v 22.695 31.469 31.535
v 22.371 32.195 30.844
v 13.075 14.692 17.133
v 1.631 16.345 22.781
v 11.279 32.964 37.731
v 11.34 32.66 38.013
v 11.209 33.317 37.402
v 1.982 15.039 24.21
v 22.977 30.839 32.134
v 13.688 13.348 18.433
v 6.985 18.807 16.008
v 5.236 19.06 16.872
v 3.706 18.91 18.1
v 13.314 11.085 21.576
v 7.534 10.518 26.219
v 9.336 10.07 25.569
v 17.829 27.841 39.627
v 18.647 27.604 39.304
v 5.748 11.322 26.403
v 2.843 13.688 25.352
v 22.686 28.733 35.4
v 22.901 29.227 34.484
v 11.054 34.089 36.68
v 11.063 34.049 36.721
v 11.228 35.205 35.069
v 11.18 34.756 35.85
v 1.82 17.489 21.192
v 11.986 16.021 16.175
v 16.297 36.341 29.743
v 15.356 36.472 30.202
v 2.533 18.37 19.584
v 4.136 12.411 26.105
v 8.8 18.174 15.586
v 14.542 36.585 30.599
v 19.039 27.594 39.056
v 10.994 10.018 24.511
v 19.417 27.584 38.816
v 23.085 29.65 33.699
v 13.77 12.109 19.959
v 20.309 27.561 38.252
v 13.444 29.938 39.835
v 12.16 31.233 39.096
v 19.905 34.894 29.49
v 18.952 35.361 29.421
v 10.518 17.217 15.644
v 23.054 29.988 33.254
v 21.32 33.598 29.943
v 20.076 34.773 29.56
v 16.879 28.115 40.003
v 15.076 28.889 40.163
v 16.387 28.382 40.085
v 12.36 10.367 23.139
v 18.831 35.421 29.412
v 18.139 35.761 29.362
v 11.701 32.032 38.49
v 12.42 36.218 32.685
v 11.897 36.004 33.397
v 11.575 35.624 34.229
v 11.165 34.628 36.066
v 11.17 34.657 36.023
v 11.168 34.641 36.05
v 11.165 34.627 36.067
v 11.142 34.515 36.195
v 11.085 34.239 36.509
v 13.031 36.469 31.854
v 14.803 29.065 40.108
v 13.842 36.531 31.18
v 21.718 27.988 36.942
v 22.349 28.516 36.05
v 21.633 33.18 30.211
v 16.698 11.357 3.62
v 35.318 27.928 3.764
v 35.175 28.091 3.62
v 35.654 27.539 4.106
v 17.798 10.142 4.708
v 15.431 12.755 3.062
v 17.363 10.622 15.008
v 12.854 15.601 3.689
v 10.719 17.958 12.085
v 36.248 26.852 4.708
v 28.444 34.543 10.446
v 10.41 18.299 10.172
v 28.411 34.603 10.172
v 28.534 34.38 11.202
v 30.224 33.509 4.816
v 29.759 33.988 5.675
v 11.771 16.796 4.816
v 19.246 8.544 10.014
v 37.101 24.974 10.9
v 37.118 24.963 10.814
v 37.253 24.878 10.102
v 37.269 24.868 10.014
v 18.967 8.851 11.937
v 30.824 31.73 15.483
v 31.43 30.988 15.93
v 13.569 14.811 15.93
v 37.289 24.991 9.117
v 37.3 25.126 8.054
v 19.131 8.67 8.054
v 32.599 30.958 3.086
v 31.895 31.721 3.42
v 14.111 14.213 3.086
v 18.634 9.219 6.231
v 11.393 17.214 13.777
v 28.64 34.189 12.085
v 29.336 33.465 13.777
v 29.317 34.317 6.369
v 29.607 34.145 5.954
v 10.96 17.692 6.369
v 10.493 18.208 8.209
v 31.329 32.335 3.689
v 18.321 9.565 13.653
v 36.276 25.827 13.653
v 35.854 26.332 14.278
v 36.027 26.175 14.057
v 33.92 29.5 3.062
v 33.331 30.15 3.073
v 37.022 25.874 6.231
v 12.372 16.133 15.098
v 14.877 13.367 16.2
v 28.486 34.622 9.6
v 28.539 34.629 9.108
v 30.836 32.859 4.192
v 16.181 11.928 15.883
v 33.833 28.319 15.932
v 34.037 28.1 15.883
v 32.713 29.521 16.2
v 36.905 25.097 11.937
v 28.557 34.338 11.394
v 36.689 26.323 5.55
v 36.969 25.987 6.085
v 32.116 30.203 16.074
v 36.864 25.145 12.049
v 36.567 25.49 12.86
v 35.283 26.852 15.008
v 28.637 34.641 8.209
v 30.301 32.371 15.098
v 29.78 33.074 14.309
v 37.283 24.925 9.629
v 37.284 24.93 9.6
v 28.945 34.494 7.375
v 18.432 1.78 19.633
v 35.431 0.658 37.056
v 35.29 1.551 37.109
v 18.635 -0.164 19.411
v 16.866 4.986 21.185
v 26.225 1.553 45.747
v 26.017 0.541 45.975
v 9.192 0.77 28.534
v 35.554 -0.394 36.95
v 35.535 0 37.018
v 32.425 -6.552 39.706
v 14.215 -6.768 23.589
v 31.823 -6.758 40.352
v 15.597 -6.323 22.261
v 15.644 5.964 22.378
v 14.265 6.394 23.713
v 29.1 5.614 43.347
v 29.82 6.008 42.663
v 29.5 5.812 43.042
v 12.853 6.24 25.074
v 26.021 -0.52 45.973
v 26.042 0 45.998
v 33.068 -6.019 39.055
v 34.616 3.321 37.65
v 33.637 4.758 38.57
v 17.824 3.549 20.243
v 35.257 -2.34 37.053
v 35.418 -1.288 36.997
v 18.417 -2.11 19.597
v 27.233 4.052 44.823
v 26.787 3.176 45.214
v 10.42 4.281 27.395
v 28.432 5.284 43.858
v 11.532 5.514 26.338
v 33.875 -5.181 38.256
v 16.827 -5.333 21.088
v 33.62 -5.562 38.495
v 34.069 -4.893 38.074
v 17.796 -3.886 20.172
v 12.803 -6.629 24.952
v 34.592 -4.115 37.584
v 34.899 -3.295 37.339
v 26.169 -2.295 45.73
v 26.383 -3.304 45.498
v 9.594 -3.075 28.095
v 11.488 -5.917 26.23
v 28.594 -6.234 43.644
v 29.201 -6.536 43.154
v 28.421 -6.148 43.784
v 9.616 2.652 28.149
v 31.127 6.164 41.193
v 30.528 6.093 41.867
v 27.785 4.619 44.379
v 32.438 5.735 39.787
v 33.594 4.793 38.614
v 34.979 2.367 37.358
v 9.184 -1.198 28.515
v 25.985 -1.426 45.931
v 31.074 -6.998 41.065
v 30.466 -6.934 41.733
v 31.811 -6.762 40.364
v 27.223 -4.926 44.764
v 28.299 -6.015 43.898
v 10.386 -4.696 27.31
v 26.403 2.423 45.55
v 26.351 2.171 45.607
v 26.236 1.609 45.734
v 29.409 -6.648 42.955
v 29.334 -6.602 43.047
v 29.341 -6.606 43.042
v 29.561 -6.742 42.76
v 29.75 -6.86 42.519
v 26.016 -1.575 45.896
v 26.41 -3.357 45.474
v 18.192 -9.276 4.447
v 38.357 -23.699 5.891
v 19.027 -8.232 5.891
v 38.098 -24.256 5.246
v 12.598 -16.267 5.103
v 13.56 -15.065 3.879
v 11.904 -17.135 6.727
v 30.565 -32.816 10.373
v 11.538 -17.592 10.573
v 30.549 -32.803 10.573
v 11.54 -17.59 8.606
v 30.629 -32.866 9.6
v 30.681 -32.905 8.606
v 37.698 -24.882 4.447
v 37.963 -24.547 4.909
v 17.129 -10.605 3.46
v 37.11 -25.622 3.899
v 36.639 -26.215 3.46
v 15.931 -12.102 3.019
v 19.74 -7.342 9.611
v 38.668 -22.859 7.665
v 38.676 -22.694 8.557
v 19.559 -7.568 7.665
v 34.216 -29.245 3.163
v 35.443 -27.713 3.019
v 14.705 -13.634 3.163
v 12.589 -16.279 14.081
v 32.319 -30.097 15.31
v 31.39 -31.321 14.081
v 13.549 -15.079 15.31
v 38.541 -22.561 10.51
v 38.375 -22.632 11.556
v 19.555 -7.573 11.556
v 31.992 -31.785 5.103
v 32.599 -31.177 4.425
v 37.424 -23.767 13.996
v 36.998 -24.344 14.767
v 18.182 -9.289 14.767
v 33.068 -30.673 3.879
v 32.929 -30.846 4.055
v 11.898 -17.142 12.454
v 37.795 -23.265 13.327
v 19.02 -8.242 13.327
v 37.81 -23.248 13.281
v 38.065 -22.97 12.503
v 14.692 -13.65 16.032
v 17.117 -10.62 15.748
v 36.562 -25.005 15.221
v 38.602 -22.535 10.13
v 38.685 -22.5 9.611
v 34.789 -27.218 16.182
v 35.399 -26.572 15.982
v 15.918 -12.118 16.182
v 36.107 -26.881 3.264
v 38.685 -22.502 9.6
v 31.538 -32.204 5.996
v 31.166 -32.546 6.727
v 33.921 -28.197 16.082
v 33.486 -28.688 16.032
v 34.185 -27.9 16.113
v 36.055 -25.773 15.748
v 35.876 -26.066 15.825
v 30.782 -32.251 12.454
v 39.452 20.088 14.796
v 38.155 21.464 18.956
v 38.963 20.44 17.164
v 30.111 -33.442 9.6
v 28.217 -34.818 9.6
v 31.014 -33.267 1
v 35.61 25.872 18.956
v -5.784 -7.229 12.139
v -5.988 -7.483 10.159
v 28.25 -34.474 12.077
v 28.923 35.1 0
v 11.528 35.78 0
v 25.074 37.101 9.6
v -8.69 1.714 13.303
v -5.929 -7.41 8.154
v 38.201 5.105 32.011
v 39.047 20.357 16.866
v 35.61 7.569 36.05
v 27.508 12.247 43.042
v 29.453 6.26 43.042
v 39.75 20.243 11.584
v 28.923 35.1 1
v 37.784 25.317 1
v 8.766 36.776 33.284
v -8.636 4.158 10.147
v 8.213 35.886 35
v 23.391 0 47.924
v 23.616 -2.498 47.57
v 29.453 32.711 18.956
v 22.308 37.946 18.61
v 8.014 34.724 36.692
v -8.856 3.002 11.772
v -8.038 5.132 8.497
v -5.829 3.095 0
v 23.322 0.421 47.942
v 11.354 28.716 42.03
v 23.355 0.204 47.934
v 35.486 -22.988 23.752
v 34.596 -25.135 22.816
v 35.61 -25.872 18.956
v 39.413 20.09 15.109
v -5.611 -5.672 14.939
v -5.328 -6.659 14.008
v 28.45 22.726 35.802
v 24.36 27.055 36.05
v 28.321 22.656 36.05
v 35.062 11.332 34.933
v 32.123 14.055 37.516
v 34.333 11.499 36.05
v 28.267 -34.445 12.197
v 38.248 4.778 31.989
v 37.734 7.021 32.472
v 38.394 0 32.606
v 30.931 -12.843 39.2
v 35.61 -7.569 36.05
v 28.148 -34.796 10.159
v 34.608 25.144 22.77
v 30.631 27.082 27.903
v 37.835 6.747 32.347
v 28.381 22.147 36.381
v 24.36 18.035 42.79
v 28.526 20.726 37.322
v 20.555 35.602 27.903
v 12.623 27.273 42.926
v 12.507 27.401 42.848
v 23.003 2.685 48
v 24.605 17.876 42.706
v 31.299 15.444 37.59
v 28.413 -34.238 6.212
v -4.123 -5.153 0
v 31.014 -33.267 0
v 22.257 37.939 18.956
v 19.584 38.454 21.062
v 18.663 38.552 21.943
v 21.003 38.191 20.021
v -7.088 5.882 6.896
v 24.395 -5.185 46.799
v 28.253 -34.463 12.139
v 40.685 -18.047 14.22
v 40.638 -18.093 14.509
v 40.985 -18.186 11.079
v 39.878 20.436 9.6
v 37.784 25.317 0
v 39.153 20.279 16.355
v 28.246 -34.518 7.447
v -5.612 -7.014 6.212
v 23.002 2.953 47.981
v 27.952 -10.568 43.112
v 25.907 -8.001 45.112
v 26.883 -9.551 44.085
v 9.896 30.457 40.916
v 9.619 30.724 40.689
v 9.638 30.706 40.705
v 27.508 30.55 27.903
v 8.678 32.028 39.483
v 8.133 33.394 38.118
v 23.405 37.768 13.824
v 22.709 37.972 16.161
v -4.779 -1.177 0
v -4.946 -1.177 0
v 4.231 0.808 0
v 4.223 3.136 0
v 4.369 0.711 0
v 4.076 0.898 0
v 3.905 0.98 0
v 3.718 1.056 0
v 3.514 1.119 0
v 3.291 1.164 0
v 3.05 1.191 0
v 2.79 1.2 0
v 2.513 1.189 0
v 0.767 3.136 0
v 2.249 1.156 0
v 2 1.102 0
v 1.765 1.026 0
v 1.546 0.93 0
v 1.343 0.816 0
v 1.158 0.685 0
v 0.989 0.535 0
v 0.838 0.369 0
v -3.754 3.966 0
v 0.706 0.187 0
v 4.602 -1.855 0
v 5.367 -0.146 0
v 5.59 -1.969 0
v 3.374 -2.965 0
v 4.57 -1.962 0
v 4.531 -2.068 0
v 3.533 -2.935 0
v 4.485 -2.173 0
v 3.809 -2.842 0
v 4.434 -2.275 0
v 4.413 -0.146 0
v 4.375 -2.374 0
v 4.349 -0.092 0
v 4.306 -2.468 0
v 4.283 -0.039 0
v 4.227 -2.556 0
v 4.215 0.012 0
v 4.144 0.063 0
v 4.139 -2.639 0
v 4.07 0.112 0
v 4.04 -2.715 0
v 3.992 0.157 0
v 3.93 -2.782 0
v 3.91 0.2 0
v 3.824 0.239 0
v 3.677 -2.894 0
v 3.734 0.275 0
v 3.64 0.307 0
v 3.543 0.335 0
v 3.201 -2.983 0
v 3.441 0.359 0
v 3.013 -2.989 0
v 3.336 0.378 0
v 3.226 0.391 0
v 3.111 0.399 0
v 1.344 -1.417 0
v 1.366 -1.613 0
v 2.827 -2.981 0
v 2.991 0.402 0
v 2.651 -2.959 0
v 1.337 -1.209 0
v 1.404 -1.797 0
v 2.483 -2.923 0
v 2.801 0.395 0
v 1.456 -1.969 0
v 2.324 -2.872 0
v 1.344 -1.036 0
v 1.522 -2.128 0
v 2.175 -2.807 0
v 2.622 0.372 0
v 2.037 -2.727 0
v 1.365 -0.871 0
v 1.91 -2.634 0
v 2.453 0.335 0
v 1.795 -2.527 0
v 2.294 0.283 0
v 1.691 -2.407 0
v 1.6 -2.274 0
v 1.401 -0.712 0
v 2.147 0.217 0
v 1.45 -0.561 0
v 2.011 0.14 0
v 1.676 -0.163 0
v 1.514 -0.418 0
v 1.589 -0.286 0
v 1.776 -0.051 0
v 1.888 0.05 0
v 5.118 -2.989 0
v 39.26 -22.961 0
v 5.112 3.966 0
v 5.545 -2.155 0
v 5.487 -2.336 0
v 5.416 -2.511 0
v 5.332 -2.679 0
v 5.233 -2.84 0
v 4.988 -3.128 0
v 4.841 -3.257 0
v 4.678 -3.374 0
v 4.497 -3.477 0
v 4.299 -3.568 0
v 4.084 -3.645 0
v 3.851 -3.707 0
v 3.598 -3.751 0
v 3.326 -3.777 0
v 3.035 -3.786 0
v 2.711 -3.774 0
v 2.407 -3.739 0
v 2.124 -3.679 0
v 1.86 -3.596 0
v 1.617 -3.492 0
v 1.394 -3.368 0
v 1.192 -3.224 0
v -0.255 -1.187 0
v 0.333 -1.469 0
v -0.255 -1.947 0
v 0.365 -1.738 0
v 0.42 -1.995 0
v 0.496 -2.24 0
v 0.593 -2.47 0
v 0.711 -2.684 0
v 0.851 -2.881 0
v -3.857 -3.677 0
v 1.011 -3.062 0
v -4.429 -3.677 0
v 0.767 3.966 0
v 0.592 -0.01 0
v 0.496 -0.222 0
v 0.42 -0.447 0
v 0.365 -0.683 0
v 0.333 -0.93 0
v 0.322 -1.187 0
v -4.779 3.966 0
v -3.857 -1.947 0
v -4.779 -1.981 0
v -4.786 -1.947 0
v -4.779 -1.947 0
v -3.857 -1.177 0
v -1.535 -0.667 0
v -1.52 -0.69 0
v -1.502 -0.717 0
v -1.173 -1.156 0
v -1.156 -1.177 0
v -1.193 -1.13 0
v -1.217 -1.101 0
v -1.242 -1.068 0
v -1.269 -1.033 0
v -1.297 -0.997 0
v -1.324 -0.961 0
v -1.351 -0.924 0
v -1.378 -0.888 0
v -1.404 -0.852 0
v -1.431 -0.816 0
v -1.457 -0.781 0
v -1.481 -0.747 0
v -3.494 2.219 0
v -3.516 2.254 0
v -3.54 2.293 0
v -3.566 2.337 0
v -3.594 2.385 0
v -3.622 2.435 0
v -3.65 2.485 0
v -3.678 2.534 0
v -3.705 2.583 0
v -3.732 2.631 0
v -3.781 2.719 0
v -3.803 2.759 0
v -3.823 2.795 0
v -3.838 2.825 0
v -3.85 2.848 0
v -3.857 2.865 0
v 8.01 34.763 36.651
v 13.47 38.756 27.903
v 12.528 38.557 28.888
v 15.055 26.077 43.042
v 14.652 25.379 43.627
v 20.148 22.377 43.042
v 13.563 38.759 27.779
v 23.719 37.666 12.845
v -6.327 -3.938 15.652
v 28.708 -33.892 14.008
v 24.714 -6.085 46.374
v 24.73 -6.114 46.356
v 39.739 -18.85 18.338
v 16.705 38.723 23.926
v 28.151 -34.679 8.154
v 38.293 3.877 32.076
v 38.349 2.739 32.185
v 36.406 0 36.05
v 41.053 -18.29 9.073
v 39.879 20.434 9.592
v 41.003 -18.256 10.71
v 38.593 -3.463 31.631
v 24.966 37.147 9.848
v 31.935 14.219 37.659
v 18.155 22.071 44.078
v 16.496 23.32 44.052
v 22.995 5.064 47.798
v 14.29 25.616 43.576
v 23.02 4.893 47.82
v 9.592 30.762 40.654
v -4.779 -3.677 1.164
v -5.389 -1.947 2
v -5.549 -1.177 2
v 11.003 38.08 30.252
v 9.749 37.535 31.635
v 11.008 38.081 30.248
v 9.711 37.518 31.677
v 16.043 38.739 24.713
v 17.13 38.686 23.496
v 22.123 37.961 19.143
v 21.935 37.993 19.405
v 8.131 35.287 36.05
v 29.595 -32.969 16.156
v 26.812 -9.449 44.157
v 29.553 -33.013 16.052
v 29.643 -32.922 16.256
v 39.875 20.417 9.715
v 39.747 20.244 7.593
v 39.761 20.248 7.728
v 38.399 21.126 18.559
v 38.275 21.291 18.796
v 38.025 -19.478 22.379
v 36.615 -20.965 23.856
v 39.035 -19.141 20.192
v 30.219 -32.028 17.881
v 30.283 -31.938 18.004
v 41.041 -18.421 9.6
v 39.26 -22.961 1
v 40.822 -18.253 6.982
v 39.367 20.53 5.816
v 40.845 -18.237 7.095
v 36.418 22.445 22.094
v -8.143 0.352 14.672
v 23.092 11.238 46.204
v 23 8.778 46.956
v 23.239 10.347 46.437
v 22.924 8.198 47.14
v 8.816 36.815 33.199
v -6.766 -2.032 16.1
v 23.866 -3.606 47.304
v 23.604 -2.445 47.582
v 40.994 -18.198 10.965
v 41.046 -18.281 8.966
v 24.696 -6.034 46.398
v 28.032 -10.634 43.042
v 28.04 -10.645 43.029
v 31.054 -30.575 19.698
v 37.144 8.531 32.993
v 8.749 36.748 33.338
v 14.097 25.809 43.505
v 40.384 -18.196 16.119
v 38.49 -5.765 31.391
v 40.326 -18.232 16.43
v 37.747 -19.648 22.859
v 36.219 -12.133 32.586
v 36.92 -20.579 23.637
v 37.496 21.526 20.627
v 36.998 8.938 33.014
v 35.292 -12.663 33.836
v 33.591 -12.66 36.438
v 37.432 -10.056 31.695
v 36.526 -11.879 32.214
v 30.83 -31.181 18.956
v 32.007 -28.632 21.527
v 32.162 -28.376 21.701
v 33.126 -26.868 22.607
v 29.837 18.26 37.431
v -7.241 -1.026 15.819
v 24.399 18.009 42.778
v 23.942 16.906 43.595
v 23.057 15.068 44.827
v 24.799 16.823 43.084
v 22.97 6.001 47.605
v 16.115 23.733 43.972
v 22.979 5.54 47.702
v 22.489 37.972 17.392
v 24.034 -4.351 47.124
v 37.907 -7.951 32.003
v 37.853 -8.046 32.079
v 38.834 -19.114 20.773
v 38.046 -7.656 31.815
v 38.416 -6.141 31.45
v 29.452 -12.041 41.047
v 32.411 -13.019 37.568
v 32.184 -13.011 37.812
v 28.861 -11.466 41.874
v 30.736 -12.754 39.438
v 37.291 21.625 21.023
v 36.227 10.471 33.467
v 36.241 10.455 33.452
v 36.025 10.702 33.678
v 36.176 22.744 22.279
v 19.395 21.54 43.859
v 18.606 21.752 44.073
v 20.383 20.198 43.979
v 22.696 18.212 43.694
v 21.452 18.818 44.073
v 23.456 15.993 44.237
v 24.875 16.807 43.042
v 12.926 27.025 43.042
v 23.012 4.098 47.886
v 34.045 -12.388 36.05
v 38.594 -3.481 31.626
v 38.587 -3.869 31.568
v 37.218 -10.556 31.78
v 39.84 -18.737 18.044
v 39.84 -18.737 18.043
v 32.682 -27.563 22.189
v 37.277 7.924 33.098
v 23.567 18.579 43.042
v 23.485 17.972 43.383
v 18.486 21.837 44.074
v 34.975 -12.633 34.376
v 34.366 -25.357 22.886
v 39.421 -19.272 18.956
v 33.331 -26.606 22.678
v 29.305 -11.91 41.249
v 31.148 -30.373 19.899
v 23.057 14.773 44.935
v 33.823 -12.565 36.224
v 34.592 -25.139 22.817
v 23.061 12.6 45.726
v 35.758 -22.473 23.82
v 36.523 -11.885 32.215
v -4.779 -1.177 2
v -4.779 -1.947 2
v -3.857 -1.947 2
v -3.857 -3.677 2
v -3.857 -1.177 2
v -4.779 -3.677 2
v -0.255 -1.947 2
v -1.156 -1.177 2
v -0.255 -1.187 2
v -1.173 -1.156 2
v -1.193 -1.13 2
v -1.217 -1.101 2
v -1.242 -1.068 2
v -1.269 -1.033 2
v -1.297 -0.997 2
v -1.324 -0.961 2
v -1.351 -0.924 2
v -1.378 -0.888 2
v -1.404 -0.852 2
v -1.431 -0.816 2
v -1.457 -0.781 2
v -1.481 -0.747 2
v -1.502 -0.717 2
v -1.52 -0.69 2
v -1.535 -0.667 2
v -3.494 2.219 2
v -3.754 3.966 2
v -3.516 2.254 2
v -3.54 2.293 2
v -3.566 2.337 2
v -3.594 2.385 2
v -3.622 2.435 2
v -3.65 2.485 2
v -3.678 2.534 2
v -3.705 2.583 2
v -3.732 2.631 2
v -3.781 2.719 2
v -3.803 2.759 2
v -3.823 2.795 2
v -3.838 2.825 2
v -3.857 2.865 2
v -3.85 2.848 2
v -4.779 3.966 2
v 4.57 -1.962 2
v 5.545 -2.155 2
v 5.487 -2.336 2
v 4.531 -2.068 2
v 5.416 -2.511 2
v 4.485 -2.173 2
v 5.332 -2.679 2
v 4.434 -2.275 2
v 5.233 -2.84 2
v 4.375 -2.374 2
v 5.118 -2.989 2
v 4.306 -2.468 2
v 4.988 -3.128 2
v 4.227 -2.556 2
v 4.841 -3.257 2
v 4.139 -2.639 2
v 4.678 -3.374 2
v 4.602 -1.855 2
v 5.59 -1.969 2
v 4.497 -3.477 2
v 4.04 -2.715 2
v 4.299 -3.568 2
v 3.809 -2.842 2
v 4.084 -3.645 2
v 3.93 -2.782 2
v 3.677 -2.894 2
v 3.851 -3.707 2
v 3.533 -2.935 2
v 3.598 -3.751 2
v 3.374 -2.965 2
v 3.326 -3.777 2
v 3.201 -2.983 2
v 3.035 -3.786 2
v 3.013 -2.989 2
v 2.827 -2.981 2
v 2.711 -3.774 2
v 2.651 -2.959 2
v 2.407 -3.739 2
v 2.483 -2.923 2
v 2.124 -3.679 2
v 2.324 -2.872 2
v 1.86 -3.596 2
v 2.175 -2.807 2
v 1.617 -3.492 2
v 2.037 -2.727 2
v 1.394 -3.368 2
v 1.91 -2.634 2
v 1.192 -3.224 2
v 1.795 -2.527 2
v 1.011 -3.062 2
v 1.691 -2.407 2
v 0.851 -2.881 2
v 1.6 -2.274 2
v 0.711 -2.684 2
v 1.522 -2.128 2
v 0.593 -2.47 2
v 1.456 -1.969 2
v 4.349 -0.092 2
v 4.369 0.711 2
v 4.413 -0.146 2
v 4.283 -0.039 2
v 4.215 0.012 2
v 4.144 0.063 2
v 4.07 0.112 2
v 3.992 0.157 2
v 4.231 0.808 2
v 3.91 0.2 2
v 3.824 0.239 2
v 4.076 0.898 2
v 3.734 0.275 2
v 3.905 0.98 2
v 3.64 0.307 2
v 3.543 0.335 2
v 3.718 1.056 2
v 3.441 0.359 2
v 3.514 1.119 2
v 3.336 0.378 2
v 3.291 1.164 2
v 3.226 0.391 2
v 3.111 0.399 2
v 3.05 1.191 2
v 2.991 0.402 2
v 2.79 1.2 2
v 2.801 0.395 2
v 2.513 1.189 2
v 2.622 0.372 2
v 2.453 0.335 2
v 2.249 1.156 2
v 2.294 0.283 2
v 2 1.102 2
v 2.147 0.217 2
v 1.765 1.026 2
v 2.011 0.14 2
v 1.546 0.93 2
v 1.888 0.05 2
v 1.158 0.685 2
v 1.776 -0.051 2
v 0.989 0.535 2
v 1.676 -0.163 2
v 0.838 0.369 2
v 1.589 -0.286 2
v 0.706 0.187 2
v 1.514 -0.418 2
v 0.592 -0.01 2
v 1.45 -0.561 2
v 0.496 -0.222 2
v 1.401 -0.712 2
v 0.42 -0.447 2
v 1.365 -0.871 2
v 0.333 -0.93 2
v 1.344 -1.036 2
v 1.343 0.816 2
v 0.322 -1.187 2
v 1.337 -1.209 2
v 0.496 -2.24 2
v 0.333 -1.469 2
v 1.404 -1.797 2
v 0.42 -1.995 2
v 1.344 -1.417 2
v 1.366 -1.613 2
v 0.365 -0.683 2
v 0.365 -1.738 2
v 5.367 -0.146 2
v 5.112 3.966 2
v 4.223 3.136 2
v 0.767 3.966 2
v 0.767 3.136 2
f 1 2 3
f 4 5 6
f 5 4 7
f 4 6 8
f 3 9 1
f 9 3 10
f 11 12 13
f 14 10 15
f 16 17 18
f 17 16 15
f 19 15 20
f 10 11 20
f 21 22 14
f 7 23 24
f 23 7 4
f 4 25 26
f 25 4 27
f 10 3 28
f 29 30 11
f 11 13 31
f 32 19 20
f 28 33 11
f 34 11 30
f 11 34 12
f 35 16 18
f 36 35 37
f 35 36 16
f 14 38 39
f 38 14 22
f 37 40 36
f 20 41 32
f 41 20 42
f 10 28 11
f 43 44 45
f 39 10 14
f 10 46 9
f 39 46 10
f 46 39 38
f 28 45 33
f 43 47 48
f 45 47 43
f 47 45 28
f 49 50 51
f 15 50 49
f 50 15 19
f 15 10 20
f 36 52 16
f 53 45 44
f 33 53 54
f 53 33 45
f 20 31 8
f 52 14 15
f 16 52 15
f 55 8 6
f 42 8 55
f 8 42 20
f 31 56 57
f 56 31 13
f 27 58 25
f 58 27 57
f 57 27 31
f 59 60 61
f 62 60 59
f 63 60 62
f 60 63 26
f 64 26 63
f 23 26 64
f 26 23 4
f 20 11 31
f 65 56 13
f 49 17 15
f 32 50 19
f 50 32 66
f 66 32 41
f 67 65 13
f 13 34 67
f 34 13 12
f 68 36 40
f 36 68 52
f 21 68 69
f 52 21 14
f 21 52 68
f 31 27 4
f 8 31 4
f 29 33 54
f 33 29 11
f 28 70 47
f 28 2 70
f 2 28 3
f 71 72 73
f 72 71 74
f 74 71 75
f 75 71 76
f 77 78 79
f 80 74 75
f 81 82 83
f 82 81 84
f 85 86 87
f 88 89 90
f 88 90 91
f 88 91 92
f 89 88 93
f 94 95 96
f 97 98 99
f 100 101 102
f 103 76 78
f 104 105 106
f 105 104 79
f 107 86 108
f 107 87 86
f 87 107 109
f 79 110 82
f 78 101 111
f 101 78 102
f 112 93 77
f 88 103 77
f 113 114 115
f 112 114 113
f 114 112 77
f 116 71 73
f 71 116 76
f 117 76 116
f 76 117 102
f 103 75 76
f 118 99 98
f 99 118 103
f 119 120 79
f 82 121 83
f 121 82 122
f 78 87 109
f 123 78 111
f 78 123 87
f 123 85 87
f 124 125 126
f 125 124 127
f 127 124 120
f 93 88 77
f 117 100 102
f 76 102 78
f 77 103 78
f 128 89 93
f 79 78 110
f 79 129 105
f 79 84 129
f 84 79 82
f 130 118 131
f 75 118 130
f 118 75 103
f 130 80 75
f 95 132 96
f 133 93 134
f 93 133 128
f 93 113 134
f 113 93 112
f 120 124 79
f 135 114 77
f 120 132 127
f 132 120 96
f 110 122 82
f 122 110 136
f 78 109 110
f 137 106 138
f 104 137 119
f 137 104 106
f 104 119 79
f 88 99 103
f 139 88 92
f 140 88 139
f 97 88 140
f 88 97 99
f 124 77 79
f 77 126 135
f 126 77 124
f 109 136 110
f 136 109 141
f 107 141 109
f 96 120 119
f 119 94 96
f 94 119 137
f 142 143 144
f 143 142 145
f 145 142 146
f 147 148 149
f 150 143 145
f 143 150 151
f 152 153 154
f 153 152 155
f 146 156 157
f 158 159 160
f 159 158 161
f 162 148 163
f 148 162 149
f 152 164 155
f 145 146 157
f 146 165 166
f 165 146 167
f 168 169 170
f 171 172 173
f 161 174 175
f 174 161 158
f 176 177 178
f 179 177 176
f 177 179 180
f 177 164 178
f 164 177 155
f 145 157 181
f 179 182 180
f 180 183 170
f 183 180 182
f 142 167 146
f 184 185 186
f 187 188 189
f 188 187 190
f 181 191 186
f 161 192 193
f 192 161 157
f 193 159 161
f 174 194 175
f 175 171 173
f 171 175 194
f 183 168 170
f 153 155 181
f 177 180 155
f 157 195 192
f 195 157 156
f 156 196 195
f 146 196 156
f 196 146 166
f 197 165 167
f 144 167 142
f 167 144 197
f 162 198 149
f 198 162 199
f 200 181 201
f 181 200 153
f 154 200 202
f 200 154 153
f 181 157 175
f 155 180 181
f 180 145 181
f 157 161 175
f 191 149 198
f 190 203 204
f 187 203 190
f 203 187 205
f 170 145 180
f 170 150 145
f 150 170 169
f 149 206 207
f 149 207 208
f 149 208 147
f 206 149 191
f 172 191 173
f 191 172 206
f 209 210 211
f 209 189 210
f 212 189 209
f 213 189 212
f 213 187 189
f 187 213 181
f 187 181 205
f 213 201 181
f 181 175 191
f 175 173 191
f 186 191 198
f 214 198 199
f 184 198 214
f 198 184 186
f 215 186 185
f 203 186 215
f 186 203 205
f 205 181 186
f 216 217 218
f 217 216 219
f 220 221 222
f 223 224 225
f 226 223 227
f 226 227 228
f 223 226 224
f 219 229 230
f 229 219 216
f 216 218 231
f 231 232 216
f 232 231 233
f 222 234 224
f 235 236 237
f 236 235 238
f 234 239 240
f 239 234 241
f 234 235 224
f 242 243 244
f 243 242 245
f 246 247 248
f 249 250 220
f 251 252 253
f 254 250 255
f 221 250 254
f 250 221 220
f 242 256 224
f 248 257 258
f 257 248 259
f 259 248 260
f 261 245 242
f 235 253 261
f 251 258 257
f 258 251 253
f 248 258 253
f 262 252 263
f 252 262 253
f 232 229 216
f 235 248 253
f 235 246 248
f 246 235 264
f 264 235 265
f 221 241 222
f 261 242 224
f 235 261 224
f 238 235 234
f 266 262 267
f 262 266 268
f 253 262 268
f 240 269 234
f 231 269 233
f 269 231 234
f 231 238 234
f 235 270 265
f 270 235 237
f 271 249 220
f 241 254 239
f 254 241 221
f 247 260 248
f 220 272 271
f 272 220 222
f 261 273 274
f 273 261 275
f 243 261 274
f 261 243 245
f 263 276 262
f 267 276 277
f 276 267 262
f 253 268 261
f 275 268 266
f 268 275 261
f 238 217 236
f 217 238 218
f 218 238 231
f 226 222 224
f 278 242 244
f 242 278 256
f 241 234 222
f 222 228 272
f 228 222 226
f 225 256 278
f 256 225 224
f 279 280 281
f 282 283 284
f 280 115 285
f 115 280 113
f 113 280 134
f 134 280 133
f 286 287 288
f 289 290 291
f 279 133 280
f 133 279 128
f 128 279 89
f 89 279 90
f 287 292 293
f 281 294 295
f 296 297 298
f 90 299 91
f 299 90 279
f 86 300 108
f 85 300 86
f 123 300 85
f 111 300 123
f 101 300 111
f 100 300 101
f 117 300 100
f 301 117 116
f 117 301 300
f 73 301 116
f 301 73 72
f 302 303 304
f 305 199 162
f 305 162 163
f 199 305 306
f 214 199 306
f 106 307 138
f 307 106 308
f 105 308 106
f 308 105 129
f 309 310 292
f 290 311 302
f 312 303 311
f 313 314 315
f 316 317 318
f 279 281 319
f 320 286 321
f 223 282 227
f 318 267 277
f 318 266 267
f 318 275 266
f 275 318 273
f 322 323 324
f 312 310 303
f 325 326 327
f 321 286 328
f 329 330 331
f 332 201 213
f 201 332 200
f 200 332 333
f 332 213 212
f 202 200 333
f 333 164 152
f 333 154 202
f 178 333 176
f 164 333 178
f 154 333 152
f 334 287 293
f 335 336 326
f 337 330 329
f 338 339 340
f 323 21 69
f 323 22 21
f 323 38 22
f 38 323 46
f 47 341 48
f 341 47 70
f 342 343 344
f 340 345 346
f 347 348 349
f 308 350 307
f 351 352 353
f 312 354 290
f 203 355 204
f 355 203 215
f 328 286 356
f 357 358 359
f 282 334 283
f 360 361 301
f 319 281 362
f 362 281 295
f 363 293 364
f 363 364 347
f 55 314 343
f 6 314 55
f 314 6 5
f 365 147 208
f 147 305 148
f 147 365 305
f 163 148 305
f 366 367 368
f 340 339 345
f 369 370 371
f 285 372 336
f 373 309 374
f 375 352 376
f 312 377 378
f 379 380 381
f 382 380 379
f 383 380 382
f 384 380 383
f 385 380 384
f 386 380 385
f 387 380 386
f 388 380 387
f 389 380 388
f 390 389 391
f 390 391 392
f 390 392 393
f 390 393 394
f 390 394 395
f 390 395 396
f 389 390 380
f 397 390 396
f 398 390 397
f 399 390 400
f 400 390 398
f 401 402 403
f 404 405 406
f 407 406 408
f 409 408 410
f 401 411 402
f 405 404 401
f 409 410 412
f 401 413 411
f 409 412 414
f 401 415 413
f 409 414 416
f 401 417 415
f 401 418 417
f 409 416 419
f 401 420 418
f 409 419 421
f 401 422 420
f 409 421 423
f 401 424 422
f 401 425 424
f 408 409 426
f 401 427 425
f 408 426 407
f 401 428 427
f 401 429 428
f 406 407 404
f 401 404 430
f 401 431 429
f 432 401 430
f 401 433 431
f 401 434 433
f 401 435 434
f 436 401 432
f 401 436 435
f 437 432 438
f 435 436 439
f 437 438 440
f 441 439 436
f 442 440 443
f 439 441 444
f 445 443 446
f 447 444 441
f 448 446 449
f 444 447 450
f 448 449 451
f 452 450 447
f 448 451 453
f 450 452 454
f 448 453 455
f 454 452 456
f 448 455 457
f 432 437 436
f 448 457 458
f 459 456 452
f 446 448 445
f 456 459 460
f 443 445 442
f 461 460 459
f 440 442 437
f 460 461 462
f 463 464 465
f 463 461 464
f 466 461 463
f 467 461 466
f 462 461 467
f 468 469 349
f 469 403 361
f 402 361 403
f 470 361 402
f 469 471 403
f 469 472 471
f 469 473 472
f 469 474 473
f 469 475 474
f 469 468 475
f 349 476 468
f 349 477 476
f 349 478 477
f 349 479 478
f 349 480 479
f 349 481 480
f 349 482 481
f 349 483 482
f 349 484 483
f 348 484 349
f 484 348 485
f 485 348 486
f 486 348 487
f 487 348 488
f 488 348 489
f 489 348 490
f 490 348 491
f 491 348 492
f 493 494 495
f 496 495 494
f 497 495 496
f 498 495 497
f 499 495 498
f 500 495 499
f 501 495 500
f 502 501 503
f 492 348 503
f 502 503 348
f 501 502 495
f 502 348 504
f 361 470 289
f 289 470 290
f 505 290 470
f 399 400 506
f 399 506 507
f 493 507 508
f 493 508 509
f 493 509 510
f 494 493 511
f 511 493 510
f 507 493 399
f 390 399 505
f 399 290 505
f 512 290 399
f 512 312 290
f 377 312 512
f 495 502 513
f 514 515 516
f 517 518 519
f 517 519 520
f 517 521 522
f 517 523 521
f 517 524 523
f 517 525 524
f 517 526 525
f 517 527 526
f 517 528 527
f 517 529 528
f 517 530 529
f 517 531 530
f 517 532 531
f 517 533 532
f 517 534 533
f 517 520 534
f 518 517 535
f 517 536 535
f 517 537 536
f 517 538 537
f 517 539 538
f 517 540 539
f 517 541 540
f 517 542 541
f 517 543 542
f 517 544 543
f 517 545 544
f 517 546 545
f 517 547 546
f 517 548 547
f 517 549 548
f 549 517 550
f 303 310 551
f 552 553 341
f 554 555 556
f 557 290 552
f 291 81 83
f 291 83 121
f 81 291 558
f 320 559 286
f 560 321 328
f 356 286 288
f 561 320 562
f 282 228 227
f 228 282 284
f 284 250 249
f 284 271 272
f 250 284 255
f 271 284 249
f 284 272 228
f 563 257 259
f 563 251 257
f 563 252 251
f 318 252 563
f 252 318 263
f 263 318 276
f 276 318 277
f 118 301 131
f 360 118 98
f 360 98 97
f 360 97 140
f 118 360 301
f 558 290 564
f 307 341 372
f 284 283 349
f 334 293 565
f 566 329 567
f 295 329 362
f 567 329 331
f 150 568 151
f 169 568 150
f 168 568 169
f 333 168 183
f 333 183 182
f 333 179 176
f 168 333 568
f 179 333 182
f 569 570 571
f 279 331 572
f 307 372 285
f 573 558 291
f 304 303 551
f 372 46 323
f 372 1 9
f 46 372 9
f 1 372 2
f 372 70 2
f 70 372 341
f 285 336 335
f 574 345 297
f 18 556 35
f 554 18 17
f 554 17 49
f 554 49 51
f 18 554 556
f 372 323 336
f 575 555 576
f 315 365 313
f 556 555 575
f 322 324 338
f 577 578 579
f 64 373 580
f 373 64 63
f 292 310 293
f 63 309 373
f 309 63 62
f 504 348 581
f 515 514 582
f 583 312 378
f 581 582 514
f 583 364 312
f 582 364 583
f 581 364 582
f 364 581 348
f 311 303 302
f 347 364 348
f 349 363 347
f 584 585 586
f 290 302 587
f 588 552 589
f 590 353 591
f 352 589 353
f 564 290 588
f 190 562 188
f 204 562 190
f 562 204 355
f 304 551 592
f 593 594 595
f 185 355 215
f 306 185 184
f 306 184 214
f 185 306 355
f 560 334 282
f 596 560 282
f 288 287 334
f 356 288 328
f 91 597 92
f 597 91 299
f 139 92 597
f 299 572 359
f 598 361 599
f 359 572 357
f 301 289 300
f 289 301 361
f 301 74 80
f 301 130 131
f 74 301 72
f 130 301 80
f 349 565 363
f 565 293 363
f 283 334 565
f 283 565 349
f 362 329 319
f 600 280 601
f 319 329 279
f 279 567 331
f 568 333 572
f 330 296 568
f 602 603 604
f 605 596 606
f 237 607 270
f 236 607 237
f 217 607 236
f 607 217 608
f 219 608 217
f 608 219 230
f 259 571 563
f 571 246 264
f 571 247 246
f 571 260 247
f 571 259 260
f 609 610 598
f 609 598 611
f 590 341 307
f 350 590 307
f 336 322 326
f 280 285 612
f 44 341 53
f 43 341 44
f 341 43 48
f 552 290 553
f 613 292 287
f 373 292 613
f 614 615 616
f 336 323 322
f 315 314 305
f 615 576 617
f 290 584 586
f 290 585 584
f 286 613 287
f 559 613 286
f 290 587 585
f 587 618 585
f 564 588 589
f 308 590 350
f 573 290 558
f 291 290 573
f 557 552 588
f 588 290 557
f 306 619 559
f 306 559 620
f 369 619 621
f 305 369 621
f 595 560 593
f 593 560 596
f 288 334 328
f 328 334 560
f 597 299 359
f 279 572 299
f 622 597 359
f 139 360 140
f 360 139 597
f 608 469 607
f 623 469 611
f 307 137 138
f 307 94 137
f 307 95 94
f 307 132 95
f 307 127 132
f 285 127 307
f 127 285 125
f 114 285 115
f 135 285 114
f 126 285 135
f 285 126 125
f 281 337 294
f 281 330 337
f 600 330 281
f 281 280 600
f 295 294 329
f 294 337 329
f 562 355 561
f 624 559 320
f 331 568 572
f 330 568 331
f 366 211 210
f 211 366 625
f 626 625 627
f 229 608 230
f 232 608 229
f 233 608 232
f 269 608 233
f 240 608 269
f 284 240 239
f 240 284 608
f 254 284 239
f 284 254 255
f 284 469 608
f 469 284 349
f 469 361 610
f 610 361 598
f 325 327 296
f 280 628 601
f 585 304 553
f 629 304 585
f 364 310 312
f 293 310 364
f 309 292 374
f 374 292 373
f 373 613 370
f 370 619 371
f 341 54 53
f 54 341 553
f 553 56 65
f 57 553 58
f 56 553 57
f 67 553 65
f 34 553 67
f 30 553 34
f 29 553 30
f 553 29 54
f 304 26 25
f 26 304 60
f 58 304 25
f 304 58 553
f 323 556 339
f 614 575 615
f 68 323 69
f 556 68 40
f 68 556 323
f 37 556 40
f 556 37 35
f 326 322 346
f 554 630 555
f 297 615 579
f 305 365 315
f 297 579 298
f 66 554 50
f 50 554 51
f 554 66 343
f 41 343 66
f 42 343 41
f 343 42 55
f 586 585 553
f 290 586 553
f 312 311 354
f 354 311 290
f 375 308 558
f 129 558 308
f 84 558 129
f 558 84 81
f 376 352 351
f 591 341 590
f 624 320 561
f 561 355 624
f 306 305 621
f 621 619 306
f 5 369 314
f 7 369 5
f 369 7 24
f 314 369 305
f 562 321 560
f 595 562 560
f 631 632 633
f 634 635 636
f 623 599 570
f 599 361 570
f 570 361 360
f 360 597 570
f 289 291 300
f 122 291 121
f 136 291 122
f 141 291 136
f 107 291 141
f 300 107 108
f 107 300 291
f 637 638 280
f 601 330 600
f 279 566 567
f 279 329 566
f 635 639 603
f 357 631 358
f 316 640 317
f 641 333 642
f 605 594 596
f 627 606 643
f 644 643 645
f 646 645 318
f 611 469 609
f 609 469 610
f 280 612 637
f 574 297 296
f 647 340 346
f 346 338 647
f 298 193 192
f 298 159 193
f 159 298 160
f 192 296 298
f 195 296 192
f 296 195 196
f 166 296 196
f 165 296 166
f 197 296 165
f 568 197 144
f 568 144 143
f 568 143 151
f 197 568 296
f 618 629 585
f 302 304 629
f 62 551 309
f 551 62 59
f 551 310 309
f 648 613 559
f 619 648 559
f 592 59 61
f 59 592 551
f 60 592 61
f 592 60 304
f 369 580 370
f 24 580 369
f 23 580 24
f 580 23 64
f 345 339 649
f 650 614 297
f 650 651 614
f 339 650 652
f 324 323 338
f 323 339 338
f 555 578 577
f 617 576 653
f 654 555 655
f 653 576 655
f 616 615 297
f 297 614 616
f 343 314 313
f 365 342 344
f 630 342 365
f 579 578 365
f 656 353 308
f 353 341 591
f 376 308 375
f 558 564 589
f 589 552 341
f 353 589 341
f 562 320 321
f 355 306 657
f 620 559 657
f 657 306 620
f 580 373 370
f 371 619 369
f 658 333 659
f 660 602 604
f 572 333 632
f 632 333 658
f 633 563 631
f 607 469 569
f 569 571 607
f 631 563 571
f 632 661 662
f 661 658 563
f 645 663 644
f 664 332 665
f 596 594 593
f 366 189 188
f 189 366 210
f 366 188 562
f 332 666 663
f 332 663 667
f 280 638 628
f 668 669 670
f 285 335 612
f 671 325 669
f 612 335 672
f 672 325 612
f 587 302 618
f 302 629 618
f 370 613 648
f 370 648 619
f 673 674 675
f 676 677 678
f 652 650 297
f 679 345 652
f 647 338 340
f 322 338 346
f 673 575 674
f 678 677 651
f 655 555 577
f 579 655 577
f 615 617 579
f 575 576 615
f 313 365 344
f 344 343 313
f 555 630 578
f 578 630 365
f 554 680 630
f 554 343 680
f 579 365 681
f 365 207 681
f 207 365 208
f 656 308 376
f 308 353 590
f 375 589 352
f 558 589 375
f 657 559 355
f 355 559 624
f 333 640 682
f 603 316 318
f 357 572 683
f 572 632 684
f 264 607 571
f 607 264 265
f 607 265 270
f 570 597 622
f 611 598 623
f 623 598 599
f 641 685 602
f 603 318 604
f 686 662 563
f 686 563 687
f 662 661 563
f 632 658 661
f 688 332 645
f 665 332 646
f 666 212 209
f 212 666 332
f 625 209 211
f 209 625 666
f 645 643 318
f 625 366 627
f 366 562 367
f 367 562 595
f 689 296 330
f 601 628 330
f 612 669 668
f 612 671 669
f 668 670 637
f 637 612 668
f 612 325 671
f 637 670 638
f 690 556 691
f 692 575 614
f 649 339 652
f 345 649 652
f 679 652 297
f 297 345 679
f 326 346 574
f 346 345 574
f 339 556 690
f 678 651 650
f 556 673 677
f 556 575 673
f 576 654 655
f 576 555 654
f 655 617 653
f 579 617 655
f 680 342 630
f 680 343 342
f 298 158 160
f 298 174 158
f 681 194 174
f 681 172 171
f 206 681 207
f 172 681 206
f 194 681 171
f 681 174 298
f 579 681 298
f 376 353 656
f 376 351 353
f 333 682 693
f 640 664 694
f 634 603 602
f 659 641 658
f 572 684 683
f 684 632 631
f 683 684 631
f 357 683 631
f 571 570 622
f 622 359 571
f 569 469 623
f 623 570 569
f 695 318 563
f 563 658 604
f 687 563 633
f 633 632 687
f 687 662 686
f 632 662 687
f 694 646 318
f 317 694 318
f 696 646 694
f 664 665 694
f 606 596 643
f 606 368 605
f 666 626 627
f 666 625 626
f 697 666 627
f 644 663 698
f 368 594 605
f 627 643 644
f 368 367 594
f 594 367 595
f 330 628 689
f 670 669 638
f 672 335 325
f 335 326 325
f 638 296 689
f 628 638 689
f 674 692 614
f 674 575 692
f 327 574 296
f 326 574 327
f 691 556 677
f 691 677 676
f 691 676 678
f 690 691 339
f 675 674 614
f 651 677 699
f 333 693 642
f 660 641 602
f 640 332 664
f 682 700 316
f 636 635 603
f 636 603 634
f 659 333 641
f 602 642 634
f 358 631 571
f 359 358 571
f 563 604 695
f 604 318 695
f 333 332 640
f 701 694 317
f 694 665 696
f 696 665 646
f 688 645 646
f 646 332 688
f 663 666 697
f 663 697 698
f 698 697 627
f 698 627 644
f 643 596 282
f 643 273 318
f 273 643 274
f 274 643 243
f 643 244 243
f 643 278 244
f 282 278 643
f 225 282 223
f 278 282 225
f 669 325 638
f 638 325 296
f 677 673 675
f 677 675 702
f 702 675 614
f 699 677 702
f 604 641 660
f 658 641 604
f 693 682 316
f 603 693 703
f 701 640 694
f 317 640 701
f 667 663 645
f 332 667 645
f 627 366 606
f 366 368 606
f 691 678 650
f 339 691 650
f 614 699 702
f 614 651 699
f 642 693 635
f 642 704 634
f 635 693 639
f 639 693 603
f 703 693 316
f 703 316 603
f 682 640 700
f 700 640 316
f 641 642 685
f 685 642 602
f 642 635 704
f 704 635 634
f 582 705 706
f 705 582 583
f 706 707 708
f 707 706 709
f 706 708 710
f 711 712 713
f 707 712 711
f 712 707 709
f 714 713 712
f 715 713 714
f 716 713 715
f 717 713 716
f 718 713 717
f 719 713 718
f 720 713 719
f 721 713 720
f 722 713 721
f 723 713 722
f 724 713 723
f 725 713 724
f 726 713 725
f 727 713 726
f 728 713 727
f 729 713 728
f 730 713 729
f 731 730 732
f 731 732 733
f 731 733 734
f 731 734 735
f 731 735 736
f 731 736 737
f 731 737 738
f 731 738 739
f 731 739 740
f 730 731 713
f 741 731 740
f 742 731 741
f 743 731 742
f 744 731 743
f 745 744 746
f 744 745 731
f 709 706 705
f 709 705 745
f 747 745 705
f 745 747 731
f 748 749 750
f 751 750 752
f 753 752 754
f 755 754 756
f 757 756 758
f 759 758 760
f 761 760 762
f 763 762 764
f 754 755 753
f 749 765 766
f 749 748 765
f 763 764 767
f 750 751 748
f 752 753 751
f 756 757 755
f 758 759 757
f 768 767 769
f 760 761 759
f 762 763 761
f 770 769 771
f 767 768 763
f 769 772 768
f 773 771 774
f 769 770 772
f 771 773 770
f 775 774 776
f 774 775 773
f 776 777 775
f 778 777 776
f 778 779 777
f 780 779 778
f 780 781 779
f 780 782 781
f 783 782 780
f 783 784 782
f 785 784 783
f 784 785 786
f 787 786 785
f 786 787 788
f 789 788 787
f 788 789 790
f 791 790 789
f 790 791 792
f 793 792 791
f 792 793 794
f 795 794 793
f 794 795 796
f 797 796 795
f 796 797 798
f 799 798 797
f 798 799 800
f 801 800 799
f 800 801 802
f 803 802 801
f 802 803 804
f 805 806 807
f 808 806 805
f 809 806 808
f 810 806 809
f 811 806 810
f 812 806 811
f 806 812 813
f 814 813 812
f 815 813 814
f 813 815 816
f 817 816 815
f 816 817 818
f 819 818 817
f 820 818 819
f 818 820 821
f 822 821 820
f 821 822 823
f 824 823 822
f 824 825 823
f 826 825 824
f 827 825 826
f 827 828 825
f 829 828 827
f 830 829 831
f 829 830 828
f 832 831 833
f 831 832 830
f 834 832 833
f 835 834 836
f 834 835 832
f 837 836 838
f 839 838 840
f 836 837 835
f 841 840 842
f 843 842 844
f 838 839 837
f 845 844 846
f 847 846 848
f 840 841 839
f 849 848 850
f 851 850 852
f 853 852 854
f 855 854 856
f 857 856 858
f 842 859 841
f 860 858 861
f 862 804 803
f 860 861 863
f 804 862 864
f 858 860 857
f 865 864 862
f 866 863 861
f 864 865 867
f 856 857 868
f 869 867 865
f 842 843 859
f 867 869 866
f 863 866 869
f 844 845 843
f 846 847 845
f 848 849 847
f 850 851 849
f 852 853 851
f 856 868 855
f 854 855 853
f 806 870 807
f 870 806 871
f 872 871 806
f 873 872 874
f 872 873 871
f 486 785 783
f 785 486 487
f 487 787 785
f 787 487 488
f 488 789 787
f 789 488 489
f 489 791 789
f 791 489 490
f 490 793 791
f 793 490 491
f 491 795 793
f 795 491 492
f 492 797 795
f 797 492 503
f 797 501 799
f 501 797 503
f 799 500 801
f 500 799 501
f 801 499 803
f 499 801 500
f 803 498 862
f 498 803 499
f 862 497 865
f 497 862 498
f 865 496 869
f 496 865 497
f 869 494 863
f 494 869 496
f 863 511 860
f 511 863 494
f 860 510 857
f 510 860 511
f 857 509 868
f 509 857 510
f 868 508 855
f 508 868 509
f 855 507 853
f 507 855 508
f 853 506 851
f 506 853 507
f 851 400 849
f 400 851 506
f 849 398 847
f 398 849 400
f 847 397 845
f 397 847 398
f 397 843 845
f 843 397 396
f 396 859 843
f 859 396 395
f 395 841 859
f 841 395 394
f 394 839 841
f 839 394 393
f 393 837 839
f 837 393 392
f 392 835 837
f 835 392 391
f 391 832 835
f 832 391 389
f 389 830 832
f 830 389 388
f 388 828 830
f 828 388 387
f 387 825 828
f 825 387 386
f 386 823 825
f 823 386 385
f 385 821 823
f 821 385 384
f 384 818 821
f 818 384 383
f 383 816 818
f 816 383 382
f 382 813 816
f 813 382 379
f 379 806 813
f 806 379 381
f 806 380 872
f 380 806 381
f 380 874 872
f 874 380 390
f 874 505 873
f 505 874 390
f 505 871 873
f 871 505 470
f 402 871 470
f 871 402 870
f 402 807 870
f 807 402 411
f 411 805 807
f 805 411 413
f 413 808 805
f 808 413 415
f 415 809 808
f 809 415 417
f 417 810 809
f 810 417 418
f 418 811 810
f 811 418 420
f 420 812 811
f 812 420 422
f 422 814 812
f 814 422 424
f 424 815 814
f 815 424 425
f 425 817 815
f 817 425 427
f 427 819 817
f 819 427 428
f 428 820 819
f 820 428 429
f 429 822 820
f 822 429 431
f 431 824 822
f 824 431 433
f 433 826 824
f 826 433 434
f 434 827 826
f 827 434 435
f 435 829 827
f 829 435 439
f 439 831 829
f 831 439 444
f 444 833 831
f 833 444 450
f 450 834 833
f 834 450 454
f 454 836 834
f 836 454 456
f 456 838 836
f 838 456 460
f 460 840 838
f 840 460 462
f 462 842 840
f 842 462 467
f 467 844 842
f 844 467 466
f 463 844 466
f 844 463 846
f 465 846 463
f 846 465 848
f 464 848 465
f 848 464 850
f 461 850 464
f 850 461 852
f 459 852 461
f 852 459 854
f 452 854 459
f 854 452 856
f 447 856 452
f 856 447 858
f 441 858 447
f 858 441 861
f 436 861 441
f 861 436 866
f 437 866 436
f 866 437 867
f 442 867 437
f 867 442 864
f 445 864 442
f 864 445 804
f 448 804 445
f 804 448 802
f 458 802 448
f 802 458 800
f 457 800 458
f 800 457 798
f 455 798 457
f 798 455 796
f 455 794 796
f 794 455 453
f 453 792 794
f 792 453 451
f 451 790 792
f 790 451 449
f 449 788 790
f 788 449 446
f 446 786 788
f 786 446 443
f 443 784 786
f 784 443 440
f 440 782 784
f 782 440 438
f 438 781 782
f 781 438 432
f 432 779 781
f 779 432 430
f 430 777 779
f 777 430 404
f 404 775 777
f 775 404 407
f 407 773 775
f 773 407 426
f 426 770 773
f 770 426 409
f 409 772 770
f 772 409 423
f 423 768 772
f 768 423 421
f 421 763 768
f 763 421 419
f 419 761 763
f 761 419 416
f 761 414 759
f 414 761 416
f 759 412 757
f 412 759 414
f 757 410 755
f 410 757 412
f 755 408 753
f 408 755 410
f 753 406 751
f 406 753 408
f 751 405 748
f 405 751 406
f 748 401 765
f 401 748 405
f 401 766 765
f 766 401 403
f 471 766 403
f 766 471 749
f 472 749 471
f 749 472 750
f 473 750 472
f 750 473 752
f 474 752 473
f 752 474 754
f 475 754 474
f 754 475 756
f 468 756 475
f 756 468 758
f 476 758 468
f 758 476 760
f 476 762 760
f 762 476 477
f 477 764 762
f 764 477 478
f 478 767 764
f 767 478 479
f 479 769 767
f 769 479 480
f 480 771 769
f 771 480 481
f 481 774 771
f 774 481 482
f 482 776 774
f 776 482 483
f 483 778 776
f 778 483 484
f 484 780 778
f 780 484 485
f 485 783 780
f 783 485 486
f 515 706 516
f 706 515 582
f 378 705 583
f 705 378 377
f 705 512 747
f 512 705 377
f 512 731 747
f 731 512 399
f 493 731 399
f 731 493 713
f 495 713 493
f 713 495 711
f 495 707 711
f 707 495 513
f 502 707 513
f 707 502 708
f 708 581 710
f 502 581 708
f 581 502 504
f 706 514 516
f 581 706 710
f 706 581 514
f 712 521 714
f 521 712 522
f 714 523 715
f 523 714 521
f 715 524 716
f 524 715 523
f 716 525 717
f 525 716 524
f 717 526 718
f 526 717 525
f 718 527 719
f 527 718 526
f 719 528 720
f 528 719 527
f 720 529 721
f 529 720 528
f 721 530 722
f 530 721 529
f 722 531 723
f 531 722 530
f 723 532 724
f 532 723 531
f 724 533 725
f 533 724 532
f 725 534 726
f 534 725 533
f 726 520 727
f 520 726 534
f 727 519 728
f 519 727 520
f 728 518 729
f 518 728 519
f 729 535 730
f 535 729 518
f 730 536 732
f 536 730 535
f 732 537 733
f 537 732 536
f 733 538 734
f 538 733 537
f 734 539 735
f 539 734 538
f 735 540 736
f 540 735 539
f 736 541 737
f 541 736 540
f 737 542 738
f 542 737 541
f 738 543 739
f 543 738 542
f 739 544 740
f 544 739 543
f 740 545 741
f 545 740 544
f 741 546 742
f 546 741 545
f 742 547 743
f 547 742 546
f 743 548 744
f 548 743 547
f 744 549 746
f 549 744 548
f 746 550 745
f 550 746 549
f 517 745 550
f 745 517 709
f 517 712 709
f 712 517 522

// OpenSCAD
difference() {
	difference() {
		difference() {
			hull() {
				union() {
					union() {
						rotate(a = 62.0301888580, v = [0, 0, 1]) {
							translate(v = [0, -6.6000000000, 0]) {
								cube(size = [37.0072589797, 13.2000000000, 1]);
							}
						}
						rotate(a = 42.1672479175, v = [0, 0, 1]) {
							translate(v = [0, -6.6000000000, 0]) {
								cube(size = [45.0000000000, 13.2000000000, 1]);
							}
						}
						rotate(a = -0.7800997449, v = [0, 0, 1]) {
							translate(v = [0, -6.6000000000, 0]) {
								cube(size = [31.2441847613, 13.2000000000, 1]);
							}
						}
						rotate(a = -38.6642535181, v = [0, 0, 1]) {
							translate(v = [0, -6.6000000000, 0]) {
								cube(size = [45.0000000000, 13.2000000000, 1]);
							}
						}
					}
					translate(v = [0, 0, 9.5999992977]) {
						intersection() {
							hull() {
								rotate(a = 55.3240337793, v = [-0.7263243176, 0.3857024701, 0.0000003406]) {
									cylinder(h = 45, r = 9.6000000000);
								}
								rotate(a = 89.9999109776, v = [-0.6712970122, 0.7411884520, -0.0000000699]) {
									cylinder(h = 45, r = 9.6000000000);
								}
								rotate(a = 43.9726174278, v = [0.0094537439, 0.6942501433, -0.0000007037]) {
									cylinder(h = 45, r = 9.6000000000);
								}
								rotate(a = 89.9999901640, v = [0.6247556290, 0.7808203404, -0.0000014056]) {
									cylinder(h = 45, r = 9.6000000000);
								}
							}
							sphere(r = 45);
						}
					}
				}
			}
			translate(v = [0, 0, 9.5999992977]) {
				rotate(a = 55.3240337793, v = [-0.7263243176, 0.3857024701, 0.0000003406]) {
					translate(v = [0, 0, 20]) {
						cylinder(h = 45, r = 6.6000000000);
					}
				}
				rotate(a = 89.9999109776, v = [-0.6712970122, 0.7411884520, -0.0000000699]) {
					translate(v = [0, 0, 20]) {
						cylinder(h = 45, r = 6.6000000000);
					}
				}
				rotate(a = 43.9726174278, v = [0.0094537439, 0.6942501433, -0.0000007037]) {
					translate(v = [0, 0, 20]) {
						cylinder(h = 45, r = 6.6000000000);
					}
				}
				rotate(a = 89.9999901640, v = [0.6247556290, 0.7808203404, -0.0000014056]) {
					translate(v = [0, 0, 20]) {
						cylinder(h = 45, r = 6.6000000000);
					}
				}
			}
		}
		translate(v = [-100, -100, -100]) {
			cube(size = [200, 200, 100]);
		}
	}
	translate(v = [0, 0, 2]) {
		rotate(a = 180, v = [0, 1, 0]) {
			linear_extrude(height = 3) {
				text(halign = "center", size = 8, text = "54", valign = "center");
			}
		}
	}
}
